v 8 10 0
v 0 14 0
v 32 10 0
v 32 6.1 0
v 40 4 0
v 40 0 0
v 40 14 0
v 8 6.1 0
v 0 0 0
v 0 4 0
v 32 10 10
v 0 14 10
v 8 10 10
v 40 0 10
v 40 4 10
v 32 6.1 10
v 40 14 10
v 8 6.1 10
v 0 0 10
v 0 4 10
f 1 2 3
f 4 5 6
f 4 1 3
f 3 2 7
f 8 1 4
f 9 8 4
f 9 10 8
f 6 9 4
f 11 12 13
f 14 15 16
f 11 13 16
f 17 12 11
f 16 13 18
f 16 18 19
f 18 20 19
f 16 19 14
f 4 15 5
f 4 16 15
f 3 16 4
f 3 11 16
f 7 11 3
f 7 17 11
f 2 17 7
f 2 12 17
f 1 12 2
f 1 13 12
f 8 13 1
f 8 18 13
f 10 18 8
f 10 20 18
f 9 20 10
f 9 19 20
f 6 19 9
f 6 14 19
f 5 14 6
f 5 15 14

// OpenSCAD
$fn = 32;

// ----------------------------------------------------------------------
// Key bar: dovetail key, 10 mm thick
// ----------------------------------------------------------------------

// --- parameters (mm) ---
profile_height = 10;      // extrusion height
profile_points = 10;      // points of the closed outline

profile = [[0, 0], [40, 0], [40, 4], [32, 6.1], [32, 10], [40, 14], [0, 14], [8, 10], [8, 6.1], [0, 4]];  // single closed polygon, 10 points, counter clockwise

// --- the one profile operation ---
linear_extrude(height = profile_height) polygon(points = profile);
